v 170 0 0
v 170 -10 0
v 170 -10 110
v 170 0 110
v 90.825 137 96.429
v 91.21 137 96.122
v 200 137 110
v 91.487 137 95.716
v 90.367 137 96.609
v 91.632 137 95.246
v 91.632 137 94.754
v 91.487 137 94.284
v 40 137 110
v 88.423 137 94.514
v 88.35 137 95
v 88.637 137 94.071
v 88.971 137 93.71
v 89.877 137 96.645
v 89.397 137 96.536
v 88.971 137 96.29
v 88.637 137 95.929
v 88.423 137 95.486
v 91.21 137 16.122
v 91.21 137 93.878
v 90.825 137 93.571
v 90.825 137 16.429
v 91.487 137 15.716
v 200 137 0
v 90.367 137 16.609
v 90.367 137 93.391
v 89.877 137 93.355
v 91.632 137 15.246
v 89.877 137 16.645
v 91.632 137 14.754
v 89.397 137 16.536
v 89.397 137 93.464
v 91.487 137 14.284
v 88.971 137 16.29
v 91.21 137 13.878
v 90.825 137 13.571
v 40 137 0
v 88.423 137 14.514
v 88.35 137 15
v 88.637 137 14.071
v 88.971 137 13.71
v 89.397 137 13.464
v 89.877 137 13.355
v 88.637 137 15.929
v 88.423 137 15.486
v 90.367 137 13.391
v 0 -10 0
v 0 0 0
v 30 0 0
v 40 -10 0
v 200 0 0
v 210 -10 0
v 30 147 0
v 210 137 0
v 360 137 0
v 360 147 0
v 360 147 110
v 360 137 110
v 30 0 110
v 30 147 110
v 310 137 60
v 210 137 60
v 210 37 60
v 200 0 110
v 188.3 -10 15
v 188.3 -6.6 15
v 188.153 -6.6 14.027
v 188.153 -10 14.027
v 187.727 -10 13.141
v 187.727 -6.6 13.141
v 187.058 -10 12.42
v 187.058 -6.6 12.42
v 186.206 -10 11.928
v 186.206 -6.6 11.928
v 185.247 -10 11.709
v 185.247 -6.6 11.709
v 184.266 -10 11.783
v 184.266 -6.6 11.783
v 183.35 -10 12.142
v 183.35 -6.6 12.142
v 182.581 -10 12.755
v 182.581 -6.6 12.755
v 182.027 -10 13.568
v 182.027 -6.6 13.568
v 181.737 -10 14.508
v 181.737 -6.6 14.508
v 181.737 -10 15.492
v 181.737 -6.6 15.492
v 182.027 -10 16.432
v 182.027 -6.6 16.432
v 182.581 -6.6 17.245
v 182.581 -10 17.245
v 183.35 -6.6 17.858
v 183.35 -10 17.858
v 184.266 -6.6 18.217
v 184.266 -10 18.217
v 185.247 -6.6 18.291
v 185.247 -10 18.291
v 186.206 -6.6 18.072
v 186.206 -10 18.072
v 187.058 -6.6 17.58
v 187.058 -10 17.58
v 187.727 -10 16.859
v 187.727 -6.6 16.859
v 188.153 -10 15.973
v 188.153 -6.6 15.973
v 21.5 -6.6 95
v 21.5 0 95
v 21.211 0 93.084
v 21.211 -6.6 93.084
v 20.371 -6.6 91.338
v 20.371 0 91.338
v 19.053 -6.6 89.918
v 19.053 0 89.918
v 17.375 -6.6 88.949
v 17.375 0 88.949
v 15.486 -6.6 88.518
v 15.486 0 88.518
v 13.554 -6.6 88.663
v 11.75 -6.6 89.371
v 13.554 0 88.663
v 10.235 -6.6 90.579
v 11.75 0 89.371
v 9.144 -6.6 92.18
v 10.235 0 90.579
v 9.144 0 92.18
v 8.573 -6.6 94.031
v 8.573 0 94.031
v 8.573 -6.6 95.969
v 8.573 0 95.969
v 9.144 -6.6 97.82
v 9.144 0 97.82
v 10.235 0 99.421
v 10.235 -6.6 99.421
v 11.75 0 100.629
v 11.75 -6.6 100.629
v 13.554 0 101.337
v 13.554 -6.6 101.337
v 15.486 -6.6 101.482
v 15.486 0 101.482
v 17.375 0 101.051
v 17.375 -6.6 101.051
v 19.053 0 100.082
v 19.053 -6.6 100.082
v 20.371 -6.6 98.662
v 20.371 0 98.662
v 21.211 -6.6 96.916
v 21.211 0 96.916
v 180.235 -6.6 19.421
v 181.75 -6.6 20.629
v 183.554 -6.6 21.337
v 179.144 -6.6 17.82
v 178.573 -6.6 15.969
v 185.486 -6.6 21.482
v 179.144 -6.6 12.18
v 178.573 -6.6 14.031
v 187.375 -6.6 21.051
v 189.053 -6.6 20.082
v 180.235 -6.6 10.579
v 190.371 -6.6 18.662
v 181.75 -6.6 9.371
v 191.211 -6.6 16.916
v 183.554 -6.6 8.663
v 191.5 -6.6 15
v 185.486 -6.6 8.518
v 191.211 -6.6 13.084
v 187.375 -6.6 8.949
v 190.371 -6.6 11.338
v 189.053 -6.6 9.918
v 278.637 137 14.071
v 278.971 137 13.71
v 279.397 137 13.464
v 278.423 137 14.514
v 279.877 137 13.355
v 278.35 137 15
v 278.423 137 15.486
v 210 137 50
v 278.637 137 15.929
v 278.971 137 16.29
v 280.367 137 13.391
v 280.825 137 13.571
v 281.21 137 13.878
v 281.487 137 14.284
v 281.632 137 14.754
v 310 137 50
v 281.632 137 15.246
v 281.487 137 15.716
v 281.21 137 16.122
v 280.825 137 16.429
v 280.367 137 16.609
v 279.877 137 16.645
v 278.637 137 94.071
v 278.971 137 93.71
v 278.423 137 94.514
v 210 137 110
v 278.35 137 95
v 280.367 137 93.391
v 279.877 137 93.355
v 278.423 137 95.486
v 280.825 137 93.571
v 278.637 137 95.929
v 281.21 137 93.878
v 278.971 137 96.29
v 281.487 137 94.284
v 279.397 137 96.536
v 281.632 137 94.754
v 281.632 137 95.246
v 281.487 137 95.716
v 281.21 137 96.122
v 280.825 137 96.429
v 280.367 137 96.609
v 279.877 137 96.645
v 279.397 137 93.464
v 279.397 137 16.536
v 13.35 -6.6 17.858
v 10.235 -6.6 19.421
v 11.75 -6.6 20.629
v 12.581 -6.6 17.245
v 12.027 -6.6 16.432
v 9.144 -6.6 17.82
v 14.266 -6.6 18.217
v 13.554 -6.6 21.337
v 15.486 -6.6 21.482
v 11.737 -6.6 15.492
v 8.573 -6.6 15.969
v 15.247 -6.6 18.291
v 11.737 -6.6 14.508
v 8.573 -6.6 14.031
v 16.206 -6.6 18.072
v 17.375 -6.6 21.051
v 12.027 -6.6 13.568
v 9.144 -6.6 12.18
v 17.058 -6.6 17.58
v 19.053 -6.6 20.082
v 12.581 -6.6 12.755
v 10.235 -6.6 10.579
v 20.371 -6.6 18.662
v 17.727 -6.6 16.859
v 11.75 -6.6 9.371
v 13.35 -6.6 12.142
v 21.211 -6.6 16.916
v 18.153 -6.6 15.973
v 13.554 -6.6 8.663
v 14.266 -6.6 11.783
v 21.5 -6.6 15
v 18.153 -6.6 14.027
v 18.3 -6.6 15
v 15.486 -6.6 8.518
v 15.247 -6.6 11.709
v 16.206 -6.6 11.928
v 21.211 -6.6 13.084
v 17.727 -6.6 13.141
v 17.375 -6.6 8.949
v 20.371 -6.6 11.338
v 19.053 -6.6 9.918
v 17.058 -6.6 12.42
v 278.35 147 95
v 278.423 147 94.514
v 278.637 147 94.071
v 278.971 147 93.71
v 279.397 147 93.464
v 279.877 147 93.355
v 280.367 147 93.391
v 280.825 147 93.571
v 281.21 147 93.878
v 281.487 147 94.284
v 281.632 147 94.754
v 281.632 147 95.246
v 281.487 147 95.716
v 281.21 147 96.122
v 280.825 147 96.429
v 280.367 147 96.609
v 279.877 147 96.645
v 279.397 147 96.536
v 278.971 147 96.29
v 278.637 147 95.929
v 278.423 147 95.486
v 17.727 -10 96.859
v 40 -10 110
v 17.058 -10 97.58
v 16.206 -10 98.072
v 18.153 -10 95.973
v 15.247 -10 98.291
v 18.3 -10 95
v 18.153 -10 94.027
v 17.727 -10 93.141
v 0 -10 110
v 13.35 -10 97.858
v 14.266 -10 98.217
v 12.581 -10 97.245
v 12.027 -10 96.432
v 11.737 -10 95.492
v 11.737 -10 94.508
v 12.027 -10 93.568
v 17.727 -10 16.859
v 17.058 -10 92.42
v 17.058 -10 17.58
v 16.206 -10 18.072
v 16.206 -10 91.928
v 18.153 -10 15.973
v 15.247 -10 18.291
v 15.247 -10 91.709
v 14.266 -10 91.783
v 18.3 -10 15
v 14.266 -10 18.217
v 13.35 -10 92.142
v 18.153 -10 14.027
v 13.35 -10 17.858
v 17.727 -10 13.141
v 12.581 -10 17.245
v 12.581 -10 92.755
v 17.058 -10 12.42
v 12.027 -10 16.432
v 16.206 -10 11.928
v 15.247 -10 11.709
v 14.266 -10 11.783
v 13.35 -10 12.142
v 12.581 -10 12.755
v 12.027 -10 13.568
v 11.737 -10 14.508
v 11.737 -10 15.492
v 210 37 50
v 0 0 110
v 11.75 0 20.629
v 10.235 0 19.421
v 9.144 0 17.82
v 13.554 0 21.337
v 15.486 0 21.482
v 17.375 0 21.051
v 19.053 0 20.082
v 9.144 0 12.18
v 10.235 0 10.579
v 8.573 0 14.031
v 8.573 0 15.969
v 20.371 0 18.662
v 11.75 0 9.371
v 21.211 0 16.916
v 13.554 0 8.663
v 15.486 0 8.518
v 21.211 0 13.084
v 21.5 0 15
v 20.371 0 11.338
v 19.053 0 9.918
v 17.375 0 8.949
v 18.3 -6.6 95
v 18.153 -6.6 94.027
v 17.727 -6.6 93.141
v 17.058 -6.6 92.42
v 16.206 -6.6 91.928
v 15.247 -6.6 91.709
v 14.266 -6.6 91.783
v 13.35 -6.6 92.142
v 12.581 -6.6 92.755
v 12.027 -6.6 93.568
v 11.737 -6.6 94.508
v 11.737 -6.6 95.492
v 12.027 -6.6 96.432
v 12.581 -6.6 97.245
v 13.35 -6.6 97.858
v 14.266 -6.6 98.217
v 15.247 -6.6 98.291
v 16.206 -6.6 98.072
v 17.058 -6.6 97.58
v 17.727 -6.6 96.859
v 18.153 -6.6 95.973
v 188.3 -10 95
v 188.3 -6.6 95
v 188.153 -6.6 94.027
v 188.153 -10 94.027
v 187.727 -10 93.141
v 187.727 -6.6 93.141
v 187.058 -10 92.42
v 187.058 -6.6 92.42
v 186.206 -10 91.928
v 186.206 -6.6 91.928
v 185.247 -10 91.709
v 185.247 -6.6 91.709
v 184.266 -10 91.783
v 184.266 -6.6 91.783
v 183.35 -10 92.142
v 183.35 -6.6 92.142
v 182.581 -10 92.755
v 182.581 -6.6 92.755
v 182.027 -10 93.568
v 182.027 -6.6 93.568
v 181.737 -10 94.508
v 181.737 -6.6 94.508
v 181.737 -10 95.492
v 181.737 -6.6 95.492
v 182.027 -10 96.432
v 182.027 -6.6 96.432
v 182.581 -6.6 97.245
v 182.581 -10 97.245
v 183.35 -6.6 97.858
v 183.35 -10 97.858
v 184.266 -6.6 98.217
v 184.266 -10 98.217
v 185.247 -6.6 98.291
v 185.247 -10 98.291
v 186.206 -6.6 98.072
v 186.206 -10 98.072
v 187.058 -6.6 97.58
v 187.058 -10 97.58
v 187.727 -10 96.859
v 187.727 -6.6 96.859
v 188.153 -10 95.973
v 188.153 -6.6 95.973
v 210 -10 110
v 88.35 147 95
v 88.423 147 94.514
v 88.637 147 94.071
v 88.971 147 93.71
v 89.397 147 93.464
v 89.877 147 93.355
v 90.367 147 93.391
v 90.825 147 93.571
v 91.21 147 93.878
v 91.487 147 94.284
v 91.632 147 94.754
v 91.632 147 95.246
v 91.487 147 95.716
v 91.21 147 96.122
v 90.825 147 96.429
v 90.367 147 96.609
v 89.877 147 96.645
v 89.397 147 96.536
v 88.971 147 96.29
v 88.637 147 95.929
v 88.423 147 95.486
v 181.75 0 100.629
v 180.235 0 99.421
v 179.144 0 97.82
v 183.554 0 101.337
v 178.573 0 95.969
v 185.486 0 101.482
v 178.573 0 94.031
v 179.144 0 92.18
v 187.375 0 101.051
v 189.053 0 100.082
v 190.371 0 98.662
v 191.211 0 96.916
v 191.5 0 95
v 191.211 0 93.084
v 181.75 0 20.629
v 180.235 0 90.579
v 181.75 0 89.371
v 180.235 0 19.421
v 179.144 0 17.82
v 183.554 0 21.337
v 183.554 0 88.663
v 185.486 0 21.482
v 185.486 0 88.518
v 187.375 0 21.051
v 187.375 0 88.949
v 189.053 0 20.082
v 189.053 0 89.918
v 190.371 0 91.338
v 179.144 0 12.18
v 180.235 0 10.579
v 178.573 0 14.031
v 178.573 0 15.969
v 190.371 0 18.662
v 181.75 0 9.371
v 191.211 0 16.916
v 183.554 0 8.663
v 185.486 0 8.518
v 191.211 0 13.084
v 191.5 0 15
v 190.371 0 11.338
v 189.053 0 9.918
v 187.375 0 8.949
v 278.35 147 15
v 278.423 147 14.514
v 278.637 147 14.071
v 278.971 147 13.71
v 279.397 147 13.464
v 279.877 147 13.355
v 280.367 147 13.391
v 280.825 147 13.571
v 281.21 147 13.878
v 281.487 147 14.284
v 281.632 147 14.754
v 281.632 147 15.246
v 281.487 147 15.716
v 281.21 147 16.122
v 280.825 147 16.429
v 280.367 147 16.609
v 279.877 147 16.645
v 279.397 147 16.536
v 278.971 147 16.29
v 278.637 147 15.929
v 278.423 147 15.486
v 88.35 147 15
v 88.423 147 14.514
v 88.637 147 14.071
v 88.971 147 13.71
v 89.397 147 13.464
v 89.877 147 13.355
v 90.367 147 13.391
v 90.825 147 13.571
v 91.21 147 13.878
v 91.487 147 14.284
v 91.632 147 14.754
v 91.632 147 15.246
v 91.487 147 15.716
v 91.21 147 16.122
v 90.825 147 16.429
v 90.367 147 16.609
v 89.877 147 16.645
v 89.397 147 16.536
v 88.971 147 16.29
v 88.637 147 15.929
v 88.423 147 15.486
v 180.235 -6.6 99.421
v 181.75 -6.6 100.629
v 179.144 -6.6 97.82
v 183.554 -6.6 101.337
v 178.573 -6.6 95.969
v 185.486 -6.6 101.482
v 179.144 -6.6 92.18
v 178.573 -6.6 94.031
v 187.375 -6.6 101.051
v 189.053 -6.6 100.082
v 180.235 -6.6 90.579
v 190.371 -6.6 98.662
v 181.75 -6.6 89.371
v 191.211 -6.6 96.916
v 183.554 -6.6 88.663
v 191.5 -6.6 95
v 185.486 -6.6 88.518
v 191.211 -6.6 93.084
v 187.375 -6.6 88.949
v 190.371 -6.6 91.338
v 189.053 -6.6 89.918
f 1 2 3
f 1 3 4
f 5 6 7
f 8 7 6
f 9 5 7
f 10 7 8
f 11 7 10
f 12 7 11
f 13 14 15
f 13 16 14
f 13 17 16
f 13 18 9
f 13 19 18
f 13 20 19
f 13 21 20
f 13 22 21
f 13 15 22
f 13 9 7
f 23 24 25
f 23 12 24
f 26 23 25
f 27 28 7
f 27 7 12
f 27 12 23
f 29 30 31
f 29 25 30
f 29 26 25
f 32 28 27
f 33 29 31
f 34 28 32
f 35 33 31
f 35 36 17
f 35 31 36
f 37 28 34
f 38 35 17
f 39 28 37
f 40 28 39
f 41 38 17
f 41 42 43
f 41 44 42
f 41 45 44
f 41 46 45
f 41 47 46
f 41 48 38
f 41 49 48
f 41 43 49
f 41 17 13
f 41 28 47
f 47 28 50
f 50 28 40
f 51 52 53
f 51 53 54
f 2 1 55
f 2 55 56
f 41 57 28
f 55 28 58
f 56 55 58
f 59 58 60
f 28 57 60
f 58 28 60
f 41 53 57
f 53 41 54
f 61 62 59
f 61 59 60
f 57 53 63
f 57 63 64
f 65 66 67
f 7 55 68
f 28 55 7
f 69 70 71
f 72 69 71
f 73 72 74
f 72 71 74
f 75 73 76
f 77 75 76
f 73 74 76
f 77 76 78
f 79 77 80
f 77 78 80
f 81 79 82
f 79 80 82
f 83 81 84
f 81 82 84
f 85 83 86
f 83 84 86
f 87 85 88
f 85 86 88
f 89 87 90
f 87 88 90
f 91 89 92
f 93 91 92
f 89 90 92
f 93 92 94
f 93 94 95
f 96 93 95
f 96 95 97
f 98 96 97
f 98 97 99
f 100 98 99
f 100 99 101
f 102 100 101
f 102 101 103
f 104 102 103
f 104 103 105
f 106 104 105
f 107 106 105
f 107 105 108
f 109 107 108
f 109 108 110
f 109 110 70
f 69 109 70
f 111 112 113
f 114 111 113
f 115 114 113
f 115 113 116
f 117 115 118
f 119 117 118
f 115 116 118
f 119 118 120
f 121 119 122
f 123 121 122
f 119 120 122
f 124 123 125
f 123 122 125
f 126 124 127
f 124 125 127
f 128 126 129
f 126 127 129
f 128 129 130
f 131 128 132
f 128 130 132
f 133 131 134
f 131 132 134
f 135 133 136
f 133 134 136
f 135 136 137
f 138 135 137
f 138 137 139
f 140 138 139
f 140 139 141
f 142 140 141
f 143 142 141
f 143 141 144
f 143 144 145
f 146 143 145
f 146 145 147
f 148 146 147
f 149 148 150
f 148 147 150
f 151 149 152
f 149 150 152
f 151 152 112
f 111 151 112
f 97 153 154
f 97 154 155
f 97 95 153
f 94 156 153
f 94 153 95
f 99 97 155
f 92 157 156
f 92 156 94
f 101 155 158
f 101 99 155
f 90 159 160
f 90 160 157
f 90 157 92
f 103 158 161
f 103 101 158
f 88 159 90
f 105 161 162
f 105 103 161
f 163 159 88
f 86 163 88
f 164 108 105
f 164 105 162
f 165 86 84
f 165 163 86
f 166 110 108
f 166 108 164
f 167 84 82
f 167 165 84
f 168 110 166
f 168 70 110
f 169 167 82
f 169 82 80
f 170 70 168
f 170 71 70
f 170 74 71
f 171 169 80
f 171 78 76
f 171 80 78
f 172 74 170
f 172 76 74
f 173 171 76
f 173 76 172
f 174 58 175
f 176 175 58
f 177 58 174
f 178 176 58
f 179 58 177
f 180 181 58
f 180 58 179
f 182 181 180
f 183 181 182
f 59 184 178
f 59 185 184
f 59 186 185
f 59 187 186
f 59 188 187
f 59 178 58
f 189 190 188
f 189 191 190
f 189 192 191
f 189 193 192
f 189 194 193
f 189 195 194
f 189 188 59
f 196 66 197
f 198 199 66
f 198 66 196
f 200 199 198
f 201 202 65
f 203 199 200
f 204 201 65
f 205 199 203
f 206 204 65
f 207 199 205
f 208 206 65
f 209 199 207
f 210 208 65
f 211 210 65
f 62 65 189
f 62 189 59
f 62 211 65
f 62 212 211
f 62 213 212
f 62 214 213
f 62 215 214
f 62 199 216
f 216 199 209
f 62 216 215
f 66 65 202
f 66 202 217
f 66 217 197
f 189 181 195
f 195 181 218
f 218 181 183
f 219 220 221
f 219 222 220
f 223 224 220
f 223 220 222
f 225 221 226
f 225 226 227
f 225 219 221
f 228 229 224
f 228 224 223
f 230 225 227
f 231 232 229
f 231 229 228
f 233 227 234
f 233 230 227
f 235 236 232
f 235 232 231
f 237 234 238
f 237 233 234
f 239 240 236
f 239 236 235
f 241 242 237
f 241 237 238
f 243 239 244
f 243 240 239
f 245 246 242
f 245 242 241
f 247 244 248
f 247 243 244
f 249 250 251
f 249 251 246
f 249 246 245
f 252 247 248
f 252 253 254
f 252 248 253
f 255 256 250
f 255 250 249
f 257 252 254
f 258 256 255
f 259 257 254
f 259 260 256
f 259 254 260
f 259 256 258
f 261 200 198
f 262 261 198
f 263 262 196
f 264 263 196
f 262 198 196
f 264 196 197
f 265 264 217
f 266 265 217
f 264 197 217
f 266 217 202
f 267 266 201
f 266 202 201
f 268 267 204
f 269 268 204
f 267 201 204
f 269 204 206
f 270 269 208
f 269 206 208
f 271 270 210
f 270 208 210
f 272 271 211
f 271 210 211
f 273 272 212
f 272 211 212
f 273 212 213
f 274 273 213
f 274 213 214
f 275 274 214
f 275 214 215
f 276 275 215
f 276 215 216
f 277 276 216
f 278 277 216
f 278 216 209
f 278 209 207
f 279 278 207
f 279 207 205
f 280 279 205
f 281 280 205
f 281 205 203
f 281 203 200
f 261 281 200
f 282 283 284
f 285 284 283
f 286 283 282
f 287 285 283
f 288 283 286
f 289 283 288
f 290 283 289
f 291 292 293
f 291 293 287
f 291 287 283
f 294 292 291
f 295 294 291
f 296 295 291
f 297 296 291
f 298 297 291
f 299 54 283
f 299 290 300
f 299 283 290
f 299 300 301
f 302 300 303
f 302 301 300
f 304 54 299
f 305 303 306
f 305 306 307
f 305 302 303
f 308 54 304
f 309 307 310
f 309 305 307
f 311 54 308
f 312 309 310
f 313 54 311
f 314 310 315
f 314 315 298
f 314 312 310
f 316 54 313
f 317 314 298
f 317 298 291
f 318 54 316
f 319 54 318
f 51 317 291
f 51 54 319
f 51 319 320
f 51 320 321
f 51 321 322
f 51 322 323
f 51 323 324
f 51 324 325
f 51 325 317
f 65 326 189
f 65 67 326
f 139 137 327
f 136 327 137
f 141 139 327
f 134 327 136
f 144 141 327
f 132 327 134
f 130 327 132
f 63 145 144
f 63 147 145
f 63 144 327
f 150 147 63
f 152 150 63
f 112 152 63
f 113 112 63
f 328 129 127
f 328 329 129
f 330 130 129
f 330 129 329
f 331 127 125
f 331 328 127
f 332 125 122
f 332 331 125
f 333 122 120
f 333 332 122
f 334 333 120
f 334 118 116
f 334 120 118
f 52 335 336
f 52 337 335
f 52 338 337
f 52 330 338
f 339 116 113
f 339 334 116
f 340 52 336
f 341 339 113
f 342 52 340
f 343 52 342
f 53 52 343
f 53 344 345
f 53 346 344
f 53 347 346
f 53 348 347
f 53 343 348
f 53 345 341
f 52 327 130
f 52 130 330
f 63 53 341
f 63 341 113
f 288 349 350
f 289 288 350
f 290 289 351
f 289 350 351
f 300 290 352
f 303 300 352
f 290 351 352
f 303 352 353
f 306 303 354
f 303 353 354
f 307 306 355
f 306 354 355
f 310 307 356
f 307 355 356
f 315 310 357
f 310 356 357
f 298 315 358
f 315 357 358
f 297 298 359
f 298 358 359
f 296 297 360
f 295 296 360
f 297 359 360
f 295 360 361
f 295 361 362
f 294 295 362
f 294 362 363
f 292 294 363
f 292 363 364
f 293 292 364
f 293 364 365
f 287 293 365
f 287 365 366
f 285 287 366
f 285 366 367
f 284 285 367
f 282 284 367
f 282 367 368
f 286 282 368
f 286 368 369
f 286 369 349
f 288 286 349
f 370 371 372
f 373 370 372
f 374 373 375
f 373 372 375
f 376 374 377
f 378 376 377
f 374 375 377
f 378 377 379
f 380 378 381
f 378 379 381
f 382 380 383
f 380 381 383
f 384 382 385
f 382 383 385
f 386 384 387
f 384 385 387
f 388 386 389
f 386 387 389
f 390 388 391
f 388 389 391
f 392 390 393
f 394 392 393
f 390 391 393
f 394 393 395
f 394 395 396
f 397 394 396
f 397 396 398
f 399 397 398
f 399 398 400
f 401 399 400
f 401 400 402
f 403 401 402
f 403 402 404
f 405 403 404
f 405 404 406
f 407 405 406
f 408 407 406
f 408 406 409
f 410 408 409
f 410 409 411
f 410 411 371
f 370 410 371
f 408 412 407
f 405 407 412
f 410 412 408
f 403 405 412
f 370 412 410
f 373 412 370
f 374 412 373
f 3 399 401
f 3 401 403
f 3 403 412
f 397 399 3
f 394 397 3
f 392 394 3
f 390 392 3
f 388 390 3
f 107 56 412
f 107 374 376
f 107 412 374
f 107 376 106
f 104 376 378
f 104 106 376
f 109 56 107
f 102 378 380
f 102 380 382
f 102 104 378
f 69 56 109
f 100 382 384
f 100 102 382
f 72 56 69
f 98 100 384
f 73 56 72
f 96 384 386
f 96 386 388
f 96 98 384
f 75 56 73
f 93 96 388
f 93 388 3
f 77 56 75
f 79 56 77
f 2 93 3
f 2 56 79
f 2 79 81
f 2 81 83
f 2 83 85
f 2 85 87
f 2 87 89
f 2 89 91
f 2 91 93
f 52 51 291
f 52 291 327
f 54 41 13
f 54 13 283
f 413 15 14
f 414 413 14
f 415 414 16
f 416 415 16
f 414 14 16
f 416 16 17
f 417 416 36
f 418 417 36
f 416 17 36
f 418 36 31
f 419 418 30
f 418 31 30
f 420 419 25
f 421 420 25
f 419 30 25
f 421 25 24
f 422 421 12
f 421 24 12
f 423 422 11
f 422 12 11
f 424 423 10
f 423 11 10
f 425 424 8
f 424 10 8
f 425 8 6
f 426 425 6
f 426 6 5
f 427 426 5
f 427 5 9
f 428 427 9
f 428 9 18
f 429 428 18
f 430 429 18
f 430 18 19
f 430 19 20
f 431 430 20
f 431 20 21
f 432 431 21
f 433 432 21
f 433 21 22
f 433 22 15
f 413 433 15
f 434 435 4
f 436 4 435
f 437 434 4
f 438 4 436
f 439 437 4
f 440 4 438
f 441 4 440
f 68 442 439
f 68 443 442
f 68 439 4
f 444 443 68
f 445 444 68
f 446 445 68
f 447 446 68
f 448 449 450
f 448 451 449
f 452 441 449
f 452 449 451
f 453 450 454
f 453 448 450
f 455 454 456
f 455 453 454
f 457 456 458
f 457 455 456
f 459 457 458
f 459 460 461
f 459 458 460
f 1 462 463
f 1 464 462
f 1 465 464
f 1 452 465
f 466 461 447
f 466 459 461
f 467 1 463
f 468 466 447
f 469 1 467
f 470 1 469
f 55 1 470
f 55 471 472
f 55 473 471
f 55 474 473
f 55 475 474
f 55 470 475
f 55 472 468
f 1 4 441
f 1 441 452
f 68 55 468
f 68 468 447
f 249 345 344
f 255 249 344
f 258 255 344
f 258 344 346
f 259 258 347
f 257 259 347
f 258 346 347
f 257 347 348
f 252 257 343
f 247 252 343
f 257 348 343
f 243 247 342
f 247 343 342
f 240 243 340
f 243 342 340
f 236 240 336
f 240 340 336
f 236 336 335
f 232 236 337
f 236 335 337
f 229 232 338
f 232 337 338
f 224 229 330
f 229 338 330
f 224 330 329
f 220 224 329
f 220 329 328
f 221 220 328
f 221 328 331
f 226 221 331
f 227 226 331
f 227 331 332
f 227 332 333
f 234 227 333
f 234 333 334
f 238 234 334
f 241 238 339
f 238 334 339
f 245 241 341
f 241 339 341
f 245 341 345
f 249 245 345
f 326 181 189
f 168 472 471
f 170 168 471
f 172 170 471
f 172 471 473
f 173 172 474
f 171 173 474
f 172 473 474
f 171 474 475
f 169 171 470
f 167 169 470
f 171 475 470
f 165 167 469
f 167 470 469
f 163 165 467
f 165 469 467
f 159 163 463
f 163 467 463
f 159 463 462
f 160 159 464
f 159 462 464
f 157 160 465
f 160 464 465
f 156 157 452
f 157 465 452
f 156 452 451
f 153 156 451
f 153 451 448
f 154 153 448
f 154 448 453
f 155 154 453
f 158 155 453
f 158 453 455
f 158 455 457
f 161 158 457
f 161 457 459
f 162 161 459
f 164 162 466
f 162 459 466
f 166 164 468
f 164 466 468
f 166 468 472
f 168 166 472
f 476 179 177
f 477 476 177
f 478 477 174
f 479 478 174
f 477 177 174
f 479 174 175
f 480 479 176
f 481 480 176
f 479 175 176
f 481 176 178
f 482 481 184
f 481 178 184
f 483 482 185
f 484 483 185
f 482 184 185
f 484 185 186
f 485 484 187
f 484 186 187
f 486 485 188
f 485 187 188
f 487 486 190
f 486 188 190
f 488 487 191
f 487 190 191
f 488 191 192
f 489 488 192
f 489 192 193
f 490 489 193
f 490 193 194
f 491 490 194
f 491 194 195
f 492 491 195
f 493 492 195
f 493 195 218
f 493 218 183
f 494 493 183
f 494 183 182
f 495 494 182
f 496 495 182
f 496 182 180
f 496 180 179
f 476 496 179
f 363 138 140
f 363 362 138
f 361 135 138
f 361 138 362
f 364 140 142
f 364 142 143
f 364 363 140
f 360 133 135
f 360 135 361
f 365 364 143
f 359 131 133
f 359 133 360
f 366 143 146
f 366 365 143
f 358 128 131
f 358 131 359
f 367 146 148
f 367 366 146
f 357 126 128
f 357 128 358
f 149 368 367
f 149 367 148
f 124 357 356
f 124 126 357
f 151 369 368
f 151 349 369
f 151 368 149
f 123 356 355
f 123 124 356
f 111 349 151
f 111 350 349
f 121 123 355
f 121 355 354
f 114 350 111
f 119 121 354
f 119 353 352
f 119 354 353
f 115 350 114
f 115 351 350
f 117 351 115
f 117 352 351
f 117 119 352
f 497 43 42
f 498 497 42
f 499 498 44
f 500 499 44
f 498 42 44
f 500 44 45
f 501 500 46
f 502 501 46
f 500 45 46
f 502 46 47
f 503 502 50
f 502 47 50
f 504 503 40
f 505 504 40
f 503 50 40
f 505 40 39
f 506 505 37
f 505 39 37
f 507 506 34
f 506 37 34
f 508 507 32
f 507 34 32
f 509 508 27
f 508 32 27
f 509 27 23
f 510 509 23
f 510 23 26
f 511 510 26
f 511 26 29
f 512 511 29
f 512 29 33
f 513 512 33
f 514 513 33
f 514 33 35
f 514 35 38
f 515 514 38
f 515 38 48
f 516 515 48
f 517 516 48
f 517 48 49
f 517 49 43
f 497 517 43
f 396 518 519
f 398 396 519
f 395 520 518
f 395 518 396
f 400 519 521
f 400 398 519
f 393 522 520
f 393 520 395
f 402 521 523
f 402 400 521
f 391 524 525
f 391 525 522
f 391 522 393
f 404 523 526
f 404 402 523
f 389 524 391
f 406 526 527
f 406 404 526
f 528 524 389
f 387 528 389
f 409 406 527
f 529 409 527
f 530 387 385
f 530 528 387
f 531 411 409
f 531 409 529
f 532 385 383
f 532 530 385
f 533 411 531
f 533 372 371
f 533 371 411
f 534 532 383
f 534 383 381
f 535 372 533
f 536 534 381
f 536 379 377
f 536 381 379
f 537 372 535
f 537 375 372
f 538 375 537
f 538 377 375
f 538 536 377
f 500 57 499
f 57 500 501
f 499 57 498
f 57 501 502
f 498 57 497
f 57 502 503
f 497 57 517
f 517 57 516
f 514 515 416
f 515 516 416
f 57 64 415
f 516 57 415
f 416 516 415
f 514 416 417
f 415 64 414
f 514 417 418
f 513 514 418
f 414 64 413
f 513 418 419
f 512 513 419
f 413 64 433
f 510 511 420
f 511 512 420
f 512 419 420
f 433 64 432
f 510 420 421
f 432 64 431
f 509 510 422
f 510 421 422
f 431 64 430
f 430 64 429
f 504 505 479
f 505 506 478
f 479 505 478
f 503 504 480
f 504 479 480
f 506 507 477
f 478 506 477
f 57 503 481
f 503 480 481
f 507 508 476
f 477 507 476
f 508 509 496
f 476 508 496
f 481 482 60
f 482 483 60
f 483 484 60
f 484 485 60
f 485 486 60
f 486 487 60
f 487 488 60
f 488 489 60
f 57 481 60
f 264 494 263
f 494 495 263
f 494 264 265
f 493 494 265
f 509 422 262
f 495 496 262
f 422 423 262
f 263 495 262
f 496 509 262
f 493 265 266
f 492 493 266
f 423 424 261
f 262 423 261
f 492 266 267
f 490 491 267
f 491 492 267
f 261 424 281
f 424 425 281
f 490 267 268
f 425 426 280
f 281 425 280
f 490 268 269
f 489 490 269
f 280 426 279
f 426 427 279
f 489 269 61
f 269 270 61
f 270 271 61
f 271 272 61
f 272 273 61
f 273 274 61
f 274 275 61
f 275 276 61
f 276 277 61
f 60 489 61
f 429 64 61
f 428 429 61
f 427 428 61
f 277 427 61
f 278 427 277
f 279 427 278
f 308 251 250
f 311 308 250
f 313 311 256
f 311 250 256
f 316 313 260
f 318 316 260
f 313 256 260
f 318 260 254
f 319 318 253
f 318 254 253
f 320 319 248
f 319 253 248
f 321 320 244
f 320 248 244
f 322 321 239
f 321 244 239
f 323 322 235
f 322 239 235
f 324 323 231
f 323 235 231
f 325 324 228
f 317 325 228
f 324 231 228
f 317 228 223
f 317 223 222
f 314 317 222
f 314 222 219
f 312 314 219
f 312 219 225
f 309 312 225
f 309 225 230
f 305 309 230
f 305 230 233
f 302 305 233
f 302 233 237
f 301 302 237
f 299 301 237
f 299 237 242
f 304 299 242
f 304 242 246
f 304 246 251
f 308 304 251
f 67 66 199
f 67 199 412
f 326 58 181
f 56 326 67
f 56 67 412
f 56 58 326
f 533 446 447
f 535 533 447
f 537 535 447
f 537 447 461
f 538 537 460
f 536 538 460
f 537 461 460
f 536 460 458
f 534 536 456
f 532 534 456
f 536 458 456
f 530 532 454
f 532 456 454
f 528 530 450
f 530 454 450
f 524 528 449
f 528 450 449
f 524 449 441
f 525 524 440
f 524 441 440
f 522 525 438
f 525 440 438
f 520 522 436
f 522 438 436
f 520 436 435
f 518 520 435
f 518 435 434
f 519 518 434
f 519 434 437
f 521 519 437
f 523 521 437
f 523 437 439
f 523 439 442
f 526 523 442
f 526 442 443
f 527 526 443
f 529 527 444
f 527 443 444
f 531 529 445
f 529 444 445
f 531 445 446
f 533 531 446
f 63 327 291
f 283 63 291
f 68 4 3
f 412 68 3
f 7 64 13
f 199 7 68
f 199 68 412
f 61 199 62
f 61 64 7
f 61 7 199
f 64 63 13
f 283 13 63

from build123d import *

# Parameters (mm, degrees)
BOSS_EXTRUDE1_DEPTH = 110
SKETCH2_R           = 3.3
CUT_EXTRUDE1_DEPTH  = 11
SKETCH3_R           = 6.5
CUT_EXTRUDE2_DEPTH  = 6.6
SKETCH5_W           = 150
SKETCH5_H           = 10
BOSS_EXTRUDE2_DEPTH = 110
BOSS_EXTRUDE3_DEPTH = 5
M4_TAPPED_HOLE1_D   = 3.3


with BuildPart() as part:
    # Sketch1 → Boss-Extrude1 (new body)
    with BuildSketch(Plane.XY):
        Polygon((0, 0), (30, 0), (30, 147), (210, 147), (210, -10), (170, -10), (170, 0), (200, 0), (200, 137), (40, 137), (40, -10), (0, -10), align=None)
    extrude(amount=BOSS_EXTRUDE1_DEPTH)

    # Sketch2 → Cut-Extrude1 (cut, through all)
    with BuildSketch(Plane(origin=(0, 0, 0), x_dir=(1, 0, 0), z_dir=(0, 1, 0))):
        with Locations((15, -15)):
            Circle(SKETCH2_R)
        with Locations((15, -95)):
            Circle(SKETCH2_R)
        with Locations((185, -95)):
            Circle(SKETCH2_R)
        with Locations((185, -15)):
            Circle(SKETCH2_R)
    extrude(amount=-CUT_EXTRUDE1_DEPTH, mode=Mode.SUBTRACT)

    # Sketch3 → Cut-Extrude2 (cut)
    with BuildSketch(Plane(origin=(0, 0, 0), x_dir=(1, 0, 0), z_dir=(0, 1, 0))):
        with Locations((15, -15)):
            Circle(SKETCH3_R)
        with Locations((15, -95)):
            Circle(SKETCH3_R)
        with Locations((185, -95)):
            Circle(SKETCH3_R)
        with Locations((185, -15)):
            Circle(SKETCH3_R)
    extrude(amount=-CUT_EXTRUDE2_DEPTH, mode=Mode.SUBTRACT)

    # Sketch5 → Boss-Extrude2 (add)
    with BuildSketch(Plane.XY.offset(110)):
        with Locations((285, 142)):
            Rectangle(SKETCH5_W, SKETCH5_H)
    extrude(amount=-BOSS_EXTRUDE2_DEPTH)

    # Sketch6 → Boss-Extrude3 (add, symmetric)
    with BuildSketch(Plane.XY.offset(55)):
        Polygon((210, 37), (310, 137), (210, 137), align=None)
    extrude(amount=BOSS_EXTRUDE3_DEPTH, both=True)

    # M4 Tapped Hole1 (through all)
    with Locations(Plane(origin=(0, 147, 0), x_dir=(1, 0, 0), z_dir=(0, 1, 0))):
        with Locations((90, -15), (280, -15), (280, -95), (90, -95)):
            Hole(M4_TAPPED_HOLE1_D / 2)


solid = part.part
